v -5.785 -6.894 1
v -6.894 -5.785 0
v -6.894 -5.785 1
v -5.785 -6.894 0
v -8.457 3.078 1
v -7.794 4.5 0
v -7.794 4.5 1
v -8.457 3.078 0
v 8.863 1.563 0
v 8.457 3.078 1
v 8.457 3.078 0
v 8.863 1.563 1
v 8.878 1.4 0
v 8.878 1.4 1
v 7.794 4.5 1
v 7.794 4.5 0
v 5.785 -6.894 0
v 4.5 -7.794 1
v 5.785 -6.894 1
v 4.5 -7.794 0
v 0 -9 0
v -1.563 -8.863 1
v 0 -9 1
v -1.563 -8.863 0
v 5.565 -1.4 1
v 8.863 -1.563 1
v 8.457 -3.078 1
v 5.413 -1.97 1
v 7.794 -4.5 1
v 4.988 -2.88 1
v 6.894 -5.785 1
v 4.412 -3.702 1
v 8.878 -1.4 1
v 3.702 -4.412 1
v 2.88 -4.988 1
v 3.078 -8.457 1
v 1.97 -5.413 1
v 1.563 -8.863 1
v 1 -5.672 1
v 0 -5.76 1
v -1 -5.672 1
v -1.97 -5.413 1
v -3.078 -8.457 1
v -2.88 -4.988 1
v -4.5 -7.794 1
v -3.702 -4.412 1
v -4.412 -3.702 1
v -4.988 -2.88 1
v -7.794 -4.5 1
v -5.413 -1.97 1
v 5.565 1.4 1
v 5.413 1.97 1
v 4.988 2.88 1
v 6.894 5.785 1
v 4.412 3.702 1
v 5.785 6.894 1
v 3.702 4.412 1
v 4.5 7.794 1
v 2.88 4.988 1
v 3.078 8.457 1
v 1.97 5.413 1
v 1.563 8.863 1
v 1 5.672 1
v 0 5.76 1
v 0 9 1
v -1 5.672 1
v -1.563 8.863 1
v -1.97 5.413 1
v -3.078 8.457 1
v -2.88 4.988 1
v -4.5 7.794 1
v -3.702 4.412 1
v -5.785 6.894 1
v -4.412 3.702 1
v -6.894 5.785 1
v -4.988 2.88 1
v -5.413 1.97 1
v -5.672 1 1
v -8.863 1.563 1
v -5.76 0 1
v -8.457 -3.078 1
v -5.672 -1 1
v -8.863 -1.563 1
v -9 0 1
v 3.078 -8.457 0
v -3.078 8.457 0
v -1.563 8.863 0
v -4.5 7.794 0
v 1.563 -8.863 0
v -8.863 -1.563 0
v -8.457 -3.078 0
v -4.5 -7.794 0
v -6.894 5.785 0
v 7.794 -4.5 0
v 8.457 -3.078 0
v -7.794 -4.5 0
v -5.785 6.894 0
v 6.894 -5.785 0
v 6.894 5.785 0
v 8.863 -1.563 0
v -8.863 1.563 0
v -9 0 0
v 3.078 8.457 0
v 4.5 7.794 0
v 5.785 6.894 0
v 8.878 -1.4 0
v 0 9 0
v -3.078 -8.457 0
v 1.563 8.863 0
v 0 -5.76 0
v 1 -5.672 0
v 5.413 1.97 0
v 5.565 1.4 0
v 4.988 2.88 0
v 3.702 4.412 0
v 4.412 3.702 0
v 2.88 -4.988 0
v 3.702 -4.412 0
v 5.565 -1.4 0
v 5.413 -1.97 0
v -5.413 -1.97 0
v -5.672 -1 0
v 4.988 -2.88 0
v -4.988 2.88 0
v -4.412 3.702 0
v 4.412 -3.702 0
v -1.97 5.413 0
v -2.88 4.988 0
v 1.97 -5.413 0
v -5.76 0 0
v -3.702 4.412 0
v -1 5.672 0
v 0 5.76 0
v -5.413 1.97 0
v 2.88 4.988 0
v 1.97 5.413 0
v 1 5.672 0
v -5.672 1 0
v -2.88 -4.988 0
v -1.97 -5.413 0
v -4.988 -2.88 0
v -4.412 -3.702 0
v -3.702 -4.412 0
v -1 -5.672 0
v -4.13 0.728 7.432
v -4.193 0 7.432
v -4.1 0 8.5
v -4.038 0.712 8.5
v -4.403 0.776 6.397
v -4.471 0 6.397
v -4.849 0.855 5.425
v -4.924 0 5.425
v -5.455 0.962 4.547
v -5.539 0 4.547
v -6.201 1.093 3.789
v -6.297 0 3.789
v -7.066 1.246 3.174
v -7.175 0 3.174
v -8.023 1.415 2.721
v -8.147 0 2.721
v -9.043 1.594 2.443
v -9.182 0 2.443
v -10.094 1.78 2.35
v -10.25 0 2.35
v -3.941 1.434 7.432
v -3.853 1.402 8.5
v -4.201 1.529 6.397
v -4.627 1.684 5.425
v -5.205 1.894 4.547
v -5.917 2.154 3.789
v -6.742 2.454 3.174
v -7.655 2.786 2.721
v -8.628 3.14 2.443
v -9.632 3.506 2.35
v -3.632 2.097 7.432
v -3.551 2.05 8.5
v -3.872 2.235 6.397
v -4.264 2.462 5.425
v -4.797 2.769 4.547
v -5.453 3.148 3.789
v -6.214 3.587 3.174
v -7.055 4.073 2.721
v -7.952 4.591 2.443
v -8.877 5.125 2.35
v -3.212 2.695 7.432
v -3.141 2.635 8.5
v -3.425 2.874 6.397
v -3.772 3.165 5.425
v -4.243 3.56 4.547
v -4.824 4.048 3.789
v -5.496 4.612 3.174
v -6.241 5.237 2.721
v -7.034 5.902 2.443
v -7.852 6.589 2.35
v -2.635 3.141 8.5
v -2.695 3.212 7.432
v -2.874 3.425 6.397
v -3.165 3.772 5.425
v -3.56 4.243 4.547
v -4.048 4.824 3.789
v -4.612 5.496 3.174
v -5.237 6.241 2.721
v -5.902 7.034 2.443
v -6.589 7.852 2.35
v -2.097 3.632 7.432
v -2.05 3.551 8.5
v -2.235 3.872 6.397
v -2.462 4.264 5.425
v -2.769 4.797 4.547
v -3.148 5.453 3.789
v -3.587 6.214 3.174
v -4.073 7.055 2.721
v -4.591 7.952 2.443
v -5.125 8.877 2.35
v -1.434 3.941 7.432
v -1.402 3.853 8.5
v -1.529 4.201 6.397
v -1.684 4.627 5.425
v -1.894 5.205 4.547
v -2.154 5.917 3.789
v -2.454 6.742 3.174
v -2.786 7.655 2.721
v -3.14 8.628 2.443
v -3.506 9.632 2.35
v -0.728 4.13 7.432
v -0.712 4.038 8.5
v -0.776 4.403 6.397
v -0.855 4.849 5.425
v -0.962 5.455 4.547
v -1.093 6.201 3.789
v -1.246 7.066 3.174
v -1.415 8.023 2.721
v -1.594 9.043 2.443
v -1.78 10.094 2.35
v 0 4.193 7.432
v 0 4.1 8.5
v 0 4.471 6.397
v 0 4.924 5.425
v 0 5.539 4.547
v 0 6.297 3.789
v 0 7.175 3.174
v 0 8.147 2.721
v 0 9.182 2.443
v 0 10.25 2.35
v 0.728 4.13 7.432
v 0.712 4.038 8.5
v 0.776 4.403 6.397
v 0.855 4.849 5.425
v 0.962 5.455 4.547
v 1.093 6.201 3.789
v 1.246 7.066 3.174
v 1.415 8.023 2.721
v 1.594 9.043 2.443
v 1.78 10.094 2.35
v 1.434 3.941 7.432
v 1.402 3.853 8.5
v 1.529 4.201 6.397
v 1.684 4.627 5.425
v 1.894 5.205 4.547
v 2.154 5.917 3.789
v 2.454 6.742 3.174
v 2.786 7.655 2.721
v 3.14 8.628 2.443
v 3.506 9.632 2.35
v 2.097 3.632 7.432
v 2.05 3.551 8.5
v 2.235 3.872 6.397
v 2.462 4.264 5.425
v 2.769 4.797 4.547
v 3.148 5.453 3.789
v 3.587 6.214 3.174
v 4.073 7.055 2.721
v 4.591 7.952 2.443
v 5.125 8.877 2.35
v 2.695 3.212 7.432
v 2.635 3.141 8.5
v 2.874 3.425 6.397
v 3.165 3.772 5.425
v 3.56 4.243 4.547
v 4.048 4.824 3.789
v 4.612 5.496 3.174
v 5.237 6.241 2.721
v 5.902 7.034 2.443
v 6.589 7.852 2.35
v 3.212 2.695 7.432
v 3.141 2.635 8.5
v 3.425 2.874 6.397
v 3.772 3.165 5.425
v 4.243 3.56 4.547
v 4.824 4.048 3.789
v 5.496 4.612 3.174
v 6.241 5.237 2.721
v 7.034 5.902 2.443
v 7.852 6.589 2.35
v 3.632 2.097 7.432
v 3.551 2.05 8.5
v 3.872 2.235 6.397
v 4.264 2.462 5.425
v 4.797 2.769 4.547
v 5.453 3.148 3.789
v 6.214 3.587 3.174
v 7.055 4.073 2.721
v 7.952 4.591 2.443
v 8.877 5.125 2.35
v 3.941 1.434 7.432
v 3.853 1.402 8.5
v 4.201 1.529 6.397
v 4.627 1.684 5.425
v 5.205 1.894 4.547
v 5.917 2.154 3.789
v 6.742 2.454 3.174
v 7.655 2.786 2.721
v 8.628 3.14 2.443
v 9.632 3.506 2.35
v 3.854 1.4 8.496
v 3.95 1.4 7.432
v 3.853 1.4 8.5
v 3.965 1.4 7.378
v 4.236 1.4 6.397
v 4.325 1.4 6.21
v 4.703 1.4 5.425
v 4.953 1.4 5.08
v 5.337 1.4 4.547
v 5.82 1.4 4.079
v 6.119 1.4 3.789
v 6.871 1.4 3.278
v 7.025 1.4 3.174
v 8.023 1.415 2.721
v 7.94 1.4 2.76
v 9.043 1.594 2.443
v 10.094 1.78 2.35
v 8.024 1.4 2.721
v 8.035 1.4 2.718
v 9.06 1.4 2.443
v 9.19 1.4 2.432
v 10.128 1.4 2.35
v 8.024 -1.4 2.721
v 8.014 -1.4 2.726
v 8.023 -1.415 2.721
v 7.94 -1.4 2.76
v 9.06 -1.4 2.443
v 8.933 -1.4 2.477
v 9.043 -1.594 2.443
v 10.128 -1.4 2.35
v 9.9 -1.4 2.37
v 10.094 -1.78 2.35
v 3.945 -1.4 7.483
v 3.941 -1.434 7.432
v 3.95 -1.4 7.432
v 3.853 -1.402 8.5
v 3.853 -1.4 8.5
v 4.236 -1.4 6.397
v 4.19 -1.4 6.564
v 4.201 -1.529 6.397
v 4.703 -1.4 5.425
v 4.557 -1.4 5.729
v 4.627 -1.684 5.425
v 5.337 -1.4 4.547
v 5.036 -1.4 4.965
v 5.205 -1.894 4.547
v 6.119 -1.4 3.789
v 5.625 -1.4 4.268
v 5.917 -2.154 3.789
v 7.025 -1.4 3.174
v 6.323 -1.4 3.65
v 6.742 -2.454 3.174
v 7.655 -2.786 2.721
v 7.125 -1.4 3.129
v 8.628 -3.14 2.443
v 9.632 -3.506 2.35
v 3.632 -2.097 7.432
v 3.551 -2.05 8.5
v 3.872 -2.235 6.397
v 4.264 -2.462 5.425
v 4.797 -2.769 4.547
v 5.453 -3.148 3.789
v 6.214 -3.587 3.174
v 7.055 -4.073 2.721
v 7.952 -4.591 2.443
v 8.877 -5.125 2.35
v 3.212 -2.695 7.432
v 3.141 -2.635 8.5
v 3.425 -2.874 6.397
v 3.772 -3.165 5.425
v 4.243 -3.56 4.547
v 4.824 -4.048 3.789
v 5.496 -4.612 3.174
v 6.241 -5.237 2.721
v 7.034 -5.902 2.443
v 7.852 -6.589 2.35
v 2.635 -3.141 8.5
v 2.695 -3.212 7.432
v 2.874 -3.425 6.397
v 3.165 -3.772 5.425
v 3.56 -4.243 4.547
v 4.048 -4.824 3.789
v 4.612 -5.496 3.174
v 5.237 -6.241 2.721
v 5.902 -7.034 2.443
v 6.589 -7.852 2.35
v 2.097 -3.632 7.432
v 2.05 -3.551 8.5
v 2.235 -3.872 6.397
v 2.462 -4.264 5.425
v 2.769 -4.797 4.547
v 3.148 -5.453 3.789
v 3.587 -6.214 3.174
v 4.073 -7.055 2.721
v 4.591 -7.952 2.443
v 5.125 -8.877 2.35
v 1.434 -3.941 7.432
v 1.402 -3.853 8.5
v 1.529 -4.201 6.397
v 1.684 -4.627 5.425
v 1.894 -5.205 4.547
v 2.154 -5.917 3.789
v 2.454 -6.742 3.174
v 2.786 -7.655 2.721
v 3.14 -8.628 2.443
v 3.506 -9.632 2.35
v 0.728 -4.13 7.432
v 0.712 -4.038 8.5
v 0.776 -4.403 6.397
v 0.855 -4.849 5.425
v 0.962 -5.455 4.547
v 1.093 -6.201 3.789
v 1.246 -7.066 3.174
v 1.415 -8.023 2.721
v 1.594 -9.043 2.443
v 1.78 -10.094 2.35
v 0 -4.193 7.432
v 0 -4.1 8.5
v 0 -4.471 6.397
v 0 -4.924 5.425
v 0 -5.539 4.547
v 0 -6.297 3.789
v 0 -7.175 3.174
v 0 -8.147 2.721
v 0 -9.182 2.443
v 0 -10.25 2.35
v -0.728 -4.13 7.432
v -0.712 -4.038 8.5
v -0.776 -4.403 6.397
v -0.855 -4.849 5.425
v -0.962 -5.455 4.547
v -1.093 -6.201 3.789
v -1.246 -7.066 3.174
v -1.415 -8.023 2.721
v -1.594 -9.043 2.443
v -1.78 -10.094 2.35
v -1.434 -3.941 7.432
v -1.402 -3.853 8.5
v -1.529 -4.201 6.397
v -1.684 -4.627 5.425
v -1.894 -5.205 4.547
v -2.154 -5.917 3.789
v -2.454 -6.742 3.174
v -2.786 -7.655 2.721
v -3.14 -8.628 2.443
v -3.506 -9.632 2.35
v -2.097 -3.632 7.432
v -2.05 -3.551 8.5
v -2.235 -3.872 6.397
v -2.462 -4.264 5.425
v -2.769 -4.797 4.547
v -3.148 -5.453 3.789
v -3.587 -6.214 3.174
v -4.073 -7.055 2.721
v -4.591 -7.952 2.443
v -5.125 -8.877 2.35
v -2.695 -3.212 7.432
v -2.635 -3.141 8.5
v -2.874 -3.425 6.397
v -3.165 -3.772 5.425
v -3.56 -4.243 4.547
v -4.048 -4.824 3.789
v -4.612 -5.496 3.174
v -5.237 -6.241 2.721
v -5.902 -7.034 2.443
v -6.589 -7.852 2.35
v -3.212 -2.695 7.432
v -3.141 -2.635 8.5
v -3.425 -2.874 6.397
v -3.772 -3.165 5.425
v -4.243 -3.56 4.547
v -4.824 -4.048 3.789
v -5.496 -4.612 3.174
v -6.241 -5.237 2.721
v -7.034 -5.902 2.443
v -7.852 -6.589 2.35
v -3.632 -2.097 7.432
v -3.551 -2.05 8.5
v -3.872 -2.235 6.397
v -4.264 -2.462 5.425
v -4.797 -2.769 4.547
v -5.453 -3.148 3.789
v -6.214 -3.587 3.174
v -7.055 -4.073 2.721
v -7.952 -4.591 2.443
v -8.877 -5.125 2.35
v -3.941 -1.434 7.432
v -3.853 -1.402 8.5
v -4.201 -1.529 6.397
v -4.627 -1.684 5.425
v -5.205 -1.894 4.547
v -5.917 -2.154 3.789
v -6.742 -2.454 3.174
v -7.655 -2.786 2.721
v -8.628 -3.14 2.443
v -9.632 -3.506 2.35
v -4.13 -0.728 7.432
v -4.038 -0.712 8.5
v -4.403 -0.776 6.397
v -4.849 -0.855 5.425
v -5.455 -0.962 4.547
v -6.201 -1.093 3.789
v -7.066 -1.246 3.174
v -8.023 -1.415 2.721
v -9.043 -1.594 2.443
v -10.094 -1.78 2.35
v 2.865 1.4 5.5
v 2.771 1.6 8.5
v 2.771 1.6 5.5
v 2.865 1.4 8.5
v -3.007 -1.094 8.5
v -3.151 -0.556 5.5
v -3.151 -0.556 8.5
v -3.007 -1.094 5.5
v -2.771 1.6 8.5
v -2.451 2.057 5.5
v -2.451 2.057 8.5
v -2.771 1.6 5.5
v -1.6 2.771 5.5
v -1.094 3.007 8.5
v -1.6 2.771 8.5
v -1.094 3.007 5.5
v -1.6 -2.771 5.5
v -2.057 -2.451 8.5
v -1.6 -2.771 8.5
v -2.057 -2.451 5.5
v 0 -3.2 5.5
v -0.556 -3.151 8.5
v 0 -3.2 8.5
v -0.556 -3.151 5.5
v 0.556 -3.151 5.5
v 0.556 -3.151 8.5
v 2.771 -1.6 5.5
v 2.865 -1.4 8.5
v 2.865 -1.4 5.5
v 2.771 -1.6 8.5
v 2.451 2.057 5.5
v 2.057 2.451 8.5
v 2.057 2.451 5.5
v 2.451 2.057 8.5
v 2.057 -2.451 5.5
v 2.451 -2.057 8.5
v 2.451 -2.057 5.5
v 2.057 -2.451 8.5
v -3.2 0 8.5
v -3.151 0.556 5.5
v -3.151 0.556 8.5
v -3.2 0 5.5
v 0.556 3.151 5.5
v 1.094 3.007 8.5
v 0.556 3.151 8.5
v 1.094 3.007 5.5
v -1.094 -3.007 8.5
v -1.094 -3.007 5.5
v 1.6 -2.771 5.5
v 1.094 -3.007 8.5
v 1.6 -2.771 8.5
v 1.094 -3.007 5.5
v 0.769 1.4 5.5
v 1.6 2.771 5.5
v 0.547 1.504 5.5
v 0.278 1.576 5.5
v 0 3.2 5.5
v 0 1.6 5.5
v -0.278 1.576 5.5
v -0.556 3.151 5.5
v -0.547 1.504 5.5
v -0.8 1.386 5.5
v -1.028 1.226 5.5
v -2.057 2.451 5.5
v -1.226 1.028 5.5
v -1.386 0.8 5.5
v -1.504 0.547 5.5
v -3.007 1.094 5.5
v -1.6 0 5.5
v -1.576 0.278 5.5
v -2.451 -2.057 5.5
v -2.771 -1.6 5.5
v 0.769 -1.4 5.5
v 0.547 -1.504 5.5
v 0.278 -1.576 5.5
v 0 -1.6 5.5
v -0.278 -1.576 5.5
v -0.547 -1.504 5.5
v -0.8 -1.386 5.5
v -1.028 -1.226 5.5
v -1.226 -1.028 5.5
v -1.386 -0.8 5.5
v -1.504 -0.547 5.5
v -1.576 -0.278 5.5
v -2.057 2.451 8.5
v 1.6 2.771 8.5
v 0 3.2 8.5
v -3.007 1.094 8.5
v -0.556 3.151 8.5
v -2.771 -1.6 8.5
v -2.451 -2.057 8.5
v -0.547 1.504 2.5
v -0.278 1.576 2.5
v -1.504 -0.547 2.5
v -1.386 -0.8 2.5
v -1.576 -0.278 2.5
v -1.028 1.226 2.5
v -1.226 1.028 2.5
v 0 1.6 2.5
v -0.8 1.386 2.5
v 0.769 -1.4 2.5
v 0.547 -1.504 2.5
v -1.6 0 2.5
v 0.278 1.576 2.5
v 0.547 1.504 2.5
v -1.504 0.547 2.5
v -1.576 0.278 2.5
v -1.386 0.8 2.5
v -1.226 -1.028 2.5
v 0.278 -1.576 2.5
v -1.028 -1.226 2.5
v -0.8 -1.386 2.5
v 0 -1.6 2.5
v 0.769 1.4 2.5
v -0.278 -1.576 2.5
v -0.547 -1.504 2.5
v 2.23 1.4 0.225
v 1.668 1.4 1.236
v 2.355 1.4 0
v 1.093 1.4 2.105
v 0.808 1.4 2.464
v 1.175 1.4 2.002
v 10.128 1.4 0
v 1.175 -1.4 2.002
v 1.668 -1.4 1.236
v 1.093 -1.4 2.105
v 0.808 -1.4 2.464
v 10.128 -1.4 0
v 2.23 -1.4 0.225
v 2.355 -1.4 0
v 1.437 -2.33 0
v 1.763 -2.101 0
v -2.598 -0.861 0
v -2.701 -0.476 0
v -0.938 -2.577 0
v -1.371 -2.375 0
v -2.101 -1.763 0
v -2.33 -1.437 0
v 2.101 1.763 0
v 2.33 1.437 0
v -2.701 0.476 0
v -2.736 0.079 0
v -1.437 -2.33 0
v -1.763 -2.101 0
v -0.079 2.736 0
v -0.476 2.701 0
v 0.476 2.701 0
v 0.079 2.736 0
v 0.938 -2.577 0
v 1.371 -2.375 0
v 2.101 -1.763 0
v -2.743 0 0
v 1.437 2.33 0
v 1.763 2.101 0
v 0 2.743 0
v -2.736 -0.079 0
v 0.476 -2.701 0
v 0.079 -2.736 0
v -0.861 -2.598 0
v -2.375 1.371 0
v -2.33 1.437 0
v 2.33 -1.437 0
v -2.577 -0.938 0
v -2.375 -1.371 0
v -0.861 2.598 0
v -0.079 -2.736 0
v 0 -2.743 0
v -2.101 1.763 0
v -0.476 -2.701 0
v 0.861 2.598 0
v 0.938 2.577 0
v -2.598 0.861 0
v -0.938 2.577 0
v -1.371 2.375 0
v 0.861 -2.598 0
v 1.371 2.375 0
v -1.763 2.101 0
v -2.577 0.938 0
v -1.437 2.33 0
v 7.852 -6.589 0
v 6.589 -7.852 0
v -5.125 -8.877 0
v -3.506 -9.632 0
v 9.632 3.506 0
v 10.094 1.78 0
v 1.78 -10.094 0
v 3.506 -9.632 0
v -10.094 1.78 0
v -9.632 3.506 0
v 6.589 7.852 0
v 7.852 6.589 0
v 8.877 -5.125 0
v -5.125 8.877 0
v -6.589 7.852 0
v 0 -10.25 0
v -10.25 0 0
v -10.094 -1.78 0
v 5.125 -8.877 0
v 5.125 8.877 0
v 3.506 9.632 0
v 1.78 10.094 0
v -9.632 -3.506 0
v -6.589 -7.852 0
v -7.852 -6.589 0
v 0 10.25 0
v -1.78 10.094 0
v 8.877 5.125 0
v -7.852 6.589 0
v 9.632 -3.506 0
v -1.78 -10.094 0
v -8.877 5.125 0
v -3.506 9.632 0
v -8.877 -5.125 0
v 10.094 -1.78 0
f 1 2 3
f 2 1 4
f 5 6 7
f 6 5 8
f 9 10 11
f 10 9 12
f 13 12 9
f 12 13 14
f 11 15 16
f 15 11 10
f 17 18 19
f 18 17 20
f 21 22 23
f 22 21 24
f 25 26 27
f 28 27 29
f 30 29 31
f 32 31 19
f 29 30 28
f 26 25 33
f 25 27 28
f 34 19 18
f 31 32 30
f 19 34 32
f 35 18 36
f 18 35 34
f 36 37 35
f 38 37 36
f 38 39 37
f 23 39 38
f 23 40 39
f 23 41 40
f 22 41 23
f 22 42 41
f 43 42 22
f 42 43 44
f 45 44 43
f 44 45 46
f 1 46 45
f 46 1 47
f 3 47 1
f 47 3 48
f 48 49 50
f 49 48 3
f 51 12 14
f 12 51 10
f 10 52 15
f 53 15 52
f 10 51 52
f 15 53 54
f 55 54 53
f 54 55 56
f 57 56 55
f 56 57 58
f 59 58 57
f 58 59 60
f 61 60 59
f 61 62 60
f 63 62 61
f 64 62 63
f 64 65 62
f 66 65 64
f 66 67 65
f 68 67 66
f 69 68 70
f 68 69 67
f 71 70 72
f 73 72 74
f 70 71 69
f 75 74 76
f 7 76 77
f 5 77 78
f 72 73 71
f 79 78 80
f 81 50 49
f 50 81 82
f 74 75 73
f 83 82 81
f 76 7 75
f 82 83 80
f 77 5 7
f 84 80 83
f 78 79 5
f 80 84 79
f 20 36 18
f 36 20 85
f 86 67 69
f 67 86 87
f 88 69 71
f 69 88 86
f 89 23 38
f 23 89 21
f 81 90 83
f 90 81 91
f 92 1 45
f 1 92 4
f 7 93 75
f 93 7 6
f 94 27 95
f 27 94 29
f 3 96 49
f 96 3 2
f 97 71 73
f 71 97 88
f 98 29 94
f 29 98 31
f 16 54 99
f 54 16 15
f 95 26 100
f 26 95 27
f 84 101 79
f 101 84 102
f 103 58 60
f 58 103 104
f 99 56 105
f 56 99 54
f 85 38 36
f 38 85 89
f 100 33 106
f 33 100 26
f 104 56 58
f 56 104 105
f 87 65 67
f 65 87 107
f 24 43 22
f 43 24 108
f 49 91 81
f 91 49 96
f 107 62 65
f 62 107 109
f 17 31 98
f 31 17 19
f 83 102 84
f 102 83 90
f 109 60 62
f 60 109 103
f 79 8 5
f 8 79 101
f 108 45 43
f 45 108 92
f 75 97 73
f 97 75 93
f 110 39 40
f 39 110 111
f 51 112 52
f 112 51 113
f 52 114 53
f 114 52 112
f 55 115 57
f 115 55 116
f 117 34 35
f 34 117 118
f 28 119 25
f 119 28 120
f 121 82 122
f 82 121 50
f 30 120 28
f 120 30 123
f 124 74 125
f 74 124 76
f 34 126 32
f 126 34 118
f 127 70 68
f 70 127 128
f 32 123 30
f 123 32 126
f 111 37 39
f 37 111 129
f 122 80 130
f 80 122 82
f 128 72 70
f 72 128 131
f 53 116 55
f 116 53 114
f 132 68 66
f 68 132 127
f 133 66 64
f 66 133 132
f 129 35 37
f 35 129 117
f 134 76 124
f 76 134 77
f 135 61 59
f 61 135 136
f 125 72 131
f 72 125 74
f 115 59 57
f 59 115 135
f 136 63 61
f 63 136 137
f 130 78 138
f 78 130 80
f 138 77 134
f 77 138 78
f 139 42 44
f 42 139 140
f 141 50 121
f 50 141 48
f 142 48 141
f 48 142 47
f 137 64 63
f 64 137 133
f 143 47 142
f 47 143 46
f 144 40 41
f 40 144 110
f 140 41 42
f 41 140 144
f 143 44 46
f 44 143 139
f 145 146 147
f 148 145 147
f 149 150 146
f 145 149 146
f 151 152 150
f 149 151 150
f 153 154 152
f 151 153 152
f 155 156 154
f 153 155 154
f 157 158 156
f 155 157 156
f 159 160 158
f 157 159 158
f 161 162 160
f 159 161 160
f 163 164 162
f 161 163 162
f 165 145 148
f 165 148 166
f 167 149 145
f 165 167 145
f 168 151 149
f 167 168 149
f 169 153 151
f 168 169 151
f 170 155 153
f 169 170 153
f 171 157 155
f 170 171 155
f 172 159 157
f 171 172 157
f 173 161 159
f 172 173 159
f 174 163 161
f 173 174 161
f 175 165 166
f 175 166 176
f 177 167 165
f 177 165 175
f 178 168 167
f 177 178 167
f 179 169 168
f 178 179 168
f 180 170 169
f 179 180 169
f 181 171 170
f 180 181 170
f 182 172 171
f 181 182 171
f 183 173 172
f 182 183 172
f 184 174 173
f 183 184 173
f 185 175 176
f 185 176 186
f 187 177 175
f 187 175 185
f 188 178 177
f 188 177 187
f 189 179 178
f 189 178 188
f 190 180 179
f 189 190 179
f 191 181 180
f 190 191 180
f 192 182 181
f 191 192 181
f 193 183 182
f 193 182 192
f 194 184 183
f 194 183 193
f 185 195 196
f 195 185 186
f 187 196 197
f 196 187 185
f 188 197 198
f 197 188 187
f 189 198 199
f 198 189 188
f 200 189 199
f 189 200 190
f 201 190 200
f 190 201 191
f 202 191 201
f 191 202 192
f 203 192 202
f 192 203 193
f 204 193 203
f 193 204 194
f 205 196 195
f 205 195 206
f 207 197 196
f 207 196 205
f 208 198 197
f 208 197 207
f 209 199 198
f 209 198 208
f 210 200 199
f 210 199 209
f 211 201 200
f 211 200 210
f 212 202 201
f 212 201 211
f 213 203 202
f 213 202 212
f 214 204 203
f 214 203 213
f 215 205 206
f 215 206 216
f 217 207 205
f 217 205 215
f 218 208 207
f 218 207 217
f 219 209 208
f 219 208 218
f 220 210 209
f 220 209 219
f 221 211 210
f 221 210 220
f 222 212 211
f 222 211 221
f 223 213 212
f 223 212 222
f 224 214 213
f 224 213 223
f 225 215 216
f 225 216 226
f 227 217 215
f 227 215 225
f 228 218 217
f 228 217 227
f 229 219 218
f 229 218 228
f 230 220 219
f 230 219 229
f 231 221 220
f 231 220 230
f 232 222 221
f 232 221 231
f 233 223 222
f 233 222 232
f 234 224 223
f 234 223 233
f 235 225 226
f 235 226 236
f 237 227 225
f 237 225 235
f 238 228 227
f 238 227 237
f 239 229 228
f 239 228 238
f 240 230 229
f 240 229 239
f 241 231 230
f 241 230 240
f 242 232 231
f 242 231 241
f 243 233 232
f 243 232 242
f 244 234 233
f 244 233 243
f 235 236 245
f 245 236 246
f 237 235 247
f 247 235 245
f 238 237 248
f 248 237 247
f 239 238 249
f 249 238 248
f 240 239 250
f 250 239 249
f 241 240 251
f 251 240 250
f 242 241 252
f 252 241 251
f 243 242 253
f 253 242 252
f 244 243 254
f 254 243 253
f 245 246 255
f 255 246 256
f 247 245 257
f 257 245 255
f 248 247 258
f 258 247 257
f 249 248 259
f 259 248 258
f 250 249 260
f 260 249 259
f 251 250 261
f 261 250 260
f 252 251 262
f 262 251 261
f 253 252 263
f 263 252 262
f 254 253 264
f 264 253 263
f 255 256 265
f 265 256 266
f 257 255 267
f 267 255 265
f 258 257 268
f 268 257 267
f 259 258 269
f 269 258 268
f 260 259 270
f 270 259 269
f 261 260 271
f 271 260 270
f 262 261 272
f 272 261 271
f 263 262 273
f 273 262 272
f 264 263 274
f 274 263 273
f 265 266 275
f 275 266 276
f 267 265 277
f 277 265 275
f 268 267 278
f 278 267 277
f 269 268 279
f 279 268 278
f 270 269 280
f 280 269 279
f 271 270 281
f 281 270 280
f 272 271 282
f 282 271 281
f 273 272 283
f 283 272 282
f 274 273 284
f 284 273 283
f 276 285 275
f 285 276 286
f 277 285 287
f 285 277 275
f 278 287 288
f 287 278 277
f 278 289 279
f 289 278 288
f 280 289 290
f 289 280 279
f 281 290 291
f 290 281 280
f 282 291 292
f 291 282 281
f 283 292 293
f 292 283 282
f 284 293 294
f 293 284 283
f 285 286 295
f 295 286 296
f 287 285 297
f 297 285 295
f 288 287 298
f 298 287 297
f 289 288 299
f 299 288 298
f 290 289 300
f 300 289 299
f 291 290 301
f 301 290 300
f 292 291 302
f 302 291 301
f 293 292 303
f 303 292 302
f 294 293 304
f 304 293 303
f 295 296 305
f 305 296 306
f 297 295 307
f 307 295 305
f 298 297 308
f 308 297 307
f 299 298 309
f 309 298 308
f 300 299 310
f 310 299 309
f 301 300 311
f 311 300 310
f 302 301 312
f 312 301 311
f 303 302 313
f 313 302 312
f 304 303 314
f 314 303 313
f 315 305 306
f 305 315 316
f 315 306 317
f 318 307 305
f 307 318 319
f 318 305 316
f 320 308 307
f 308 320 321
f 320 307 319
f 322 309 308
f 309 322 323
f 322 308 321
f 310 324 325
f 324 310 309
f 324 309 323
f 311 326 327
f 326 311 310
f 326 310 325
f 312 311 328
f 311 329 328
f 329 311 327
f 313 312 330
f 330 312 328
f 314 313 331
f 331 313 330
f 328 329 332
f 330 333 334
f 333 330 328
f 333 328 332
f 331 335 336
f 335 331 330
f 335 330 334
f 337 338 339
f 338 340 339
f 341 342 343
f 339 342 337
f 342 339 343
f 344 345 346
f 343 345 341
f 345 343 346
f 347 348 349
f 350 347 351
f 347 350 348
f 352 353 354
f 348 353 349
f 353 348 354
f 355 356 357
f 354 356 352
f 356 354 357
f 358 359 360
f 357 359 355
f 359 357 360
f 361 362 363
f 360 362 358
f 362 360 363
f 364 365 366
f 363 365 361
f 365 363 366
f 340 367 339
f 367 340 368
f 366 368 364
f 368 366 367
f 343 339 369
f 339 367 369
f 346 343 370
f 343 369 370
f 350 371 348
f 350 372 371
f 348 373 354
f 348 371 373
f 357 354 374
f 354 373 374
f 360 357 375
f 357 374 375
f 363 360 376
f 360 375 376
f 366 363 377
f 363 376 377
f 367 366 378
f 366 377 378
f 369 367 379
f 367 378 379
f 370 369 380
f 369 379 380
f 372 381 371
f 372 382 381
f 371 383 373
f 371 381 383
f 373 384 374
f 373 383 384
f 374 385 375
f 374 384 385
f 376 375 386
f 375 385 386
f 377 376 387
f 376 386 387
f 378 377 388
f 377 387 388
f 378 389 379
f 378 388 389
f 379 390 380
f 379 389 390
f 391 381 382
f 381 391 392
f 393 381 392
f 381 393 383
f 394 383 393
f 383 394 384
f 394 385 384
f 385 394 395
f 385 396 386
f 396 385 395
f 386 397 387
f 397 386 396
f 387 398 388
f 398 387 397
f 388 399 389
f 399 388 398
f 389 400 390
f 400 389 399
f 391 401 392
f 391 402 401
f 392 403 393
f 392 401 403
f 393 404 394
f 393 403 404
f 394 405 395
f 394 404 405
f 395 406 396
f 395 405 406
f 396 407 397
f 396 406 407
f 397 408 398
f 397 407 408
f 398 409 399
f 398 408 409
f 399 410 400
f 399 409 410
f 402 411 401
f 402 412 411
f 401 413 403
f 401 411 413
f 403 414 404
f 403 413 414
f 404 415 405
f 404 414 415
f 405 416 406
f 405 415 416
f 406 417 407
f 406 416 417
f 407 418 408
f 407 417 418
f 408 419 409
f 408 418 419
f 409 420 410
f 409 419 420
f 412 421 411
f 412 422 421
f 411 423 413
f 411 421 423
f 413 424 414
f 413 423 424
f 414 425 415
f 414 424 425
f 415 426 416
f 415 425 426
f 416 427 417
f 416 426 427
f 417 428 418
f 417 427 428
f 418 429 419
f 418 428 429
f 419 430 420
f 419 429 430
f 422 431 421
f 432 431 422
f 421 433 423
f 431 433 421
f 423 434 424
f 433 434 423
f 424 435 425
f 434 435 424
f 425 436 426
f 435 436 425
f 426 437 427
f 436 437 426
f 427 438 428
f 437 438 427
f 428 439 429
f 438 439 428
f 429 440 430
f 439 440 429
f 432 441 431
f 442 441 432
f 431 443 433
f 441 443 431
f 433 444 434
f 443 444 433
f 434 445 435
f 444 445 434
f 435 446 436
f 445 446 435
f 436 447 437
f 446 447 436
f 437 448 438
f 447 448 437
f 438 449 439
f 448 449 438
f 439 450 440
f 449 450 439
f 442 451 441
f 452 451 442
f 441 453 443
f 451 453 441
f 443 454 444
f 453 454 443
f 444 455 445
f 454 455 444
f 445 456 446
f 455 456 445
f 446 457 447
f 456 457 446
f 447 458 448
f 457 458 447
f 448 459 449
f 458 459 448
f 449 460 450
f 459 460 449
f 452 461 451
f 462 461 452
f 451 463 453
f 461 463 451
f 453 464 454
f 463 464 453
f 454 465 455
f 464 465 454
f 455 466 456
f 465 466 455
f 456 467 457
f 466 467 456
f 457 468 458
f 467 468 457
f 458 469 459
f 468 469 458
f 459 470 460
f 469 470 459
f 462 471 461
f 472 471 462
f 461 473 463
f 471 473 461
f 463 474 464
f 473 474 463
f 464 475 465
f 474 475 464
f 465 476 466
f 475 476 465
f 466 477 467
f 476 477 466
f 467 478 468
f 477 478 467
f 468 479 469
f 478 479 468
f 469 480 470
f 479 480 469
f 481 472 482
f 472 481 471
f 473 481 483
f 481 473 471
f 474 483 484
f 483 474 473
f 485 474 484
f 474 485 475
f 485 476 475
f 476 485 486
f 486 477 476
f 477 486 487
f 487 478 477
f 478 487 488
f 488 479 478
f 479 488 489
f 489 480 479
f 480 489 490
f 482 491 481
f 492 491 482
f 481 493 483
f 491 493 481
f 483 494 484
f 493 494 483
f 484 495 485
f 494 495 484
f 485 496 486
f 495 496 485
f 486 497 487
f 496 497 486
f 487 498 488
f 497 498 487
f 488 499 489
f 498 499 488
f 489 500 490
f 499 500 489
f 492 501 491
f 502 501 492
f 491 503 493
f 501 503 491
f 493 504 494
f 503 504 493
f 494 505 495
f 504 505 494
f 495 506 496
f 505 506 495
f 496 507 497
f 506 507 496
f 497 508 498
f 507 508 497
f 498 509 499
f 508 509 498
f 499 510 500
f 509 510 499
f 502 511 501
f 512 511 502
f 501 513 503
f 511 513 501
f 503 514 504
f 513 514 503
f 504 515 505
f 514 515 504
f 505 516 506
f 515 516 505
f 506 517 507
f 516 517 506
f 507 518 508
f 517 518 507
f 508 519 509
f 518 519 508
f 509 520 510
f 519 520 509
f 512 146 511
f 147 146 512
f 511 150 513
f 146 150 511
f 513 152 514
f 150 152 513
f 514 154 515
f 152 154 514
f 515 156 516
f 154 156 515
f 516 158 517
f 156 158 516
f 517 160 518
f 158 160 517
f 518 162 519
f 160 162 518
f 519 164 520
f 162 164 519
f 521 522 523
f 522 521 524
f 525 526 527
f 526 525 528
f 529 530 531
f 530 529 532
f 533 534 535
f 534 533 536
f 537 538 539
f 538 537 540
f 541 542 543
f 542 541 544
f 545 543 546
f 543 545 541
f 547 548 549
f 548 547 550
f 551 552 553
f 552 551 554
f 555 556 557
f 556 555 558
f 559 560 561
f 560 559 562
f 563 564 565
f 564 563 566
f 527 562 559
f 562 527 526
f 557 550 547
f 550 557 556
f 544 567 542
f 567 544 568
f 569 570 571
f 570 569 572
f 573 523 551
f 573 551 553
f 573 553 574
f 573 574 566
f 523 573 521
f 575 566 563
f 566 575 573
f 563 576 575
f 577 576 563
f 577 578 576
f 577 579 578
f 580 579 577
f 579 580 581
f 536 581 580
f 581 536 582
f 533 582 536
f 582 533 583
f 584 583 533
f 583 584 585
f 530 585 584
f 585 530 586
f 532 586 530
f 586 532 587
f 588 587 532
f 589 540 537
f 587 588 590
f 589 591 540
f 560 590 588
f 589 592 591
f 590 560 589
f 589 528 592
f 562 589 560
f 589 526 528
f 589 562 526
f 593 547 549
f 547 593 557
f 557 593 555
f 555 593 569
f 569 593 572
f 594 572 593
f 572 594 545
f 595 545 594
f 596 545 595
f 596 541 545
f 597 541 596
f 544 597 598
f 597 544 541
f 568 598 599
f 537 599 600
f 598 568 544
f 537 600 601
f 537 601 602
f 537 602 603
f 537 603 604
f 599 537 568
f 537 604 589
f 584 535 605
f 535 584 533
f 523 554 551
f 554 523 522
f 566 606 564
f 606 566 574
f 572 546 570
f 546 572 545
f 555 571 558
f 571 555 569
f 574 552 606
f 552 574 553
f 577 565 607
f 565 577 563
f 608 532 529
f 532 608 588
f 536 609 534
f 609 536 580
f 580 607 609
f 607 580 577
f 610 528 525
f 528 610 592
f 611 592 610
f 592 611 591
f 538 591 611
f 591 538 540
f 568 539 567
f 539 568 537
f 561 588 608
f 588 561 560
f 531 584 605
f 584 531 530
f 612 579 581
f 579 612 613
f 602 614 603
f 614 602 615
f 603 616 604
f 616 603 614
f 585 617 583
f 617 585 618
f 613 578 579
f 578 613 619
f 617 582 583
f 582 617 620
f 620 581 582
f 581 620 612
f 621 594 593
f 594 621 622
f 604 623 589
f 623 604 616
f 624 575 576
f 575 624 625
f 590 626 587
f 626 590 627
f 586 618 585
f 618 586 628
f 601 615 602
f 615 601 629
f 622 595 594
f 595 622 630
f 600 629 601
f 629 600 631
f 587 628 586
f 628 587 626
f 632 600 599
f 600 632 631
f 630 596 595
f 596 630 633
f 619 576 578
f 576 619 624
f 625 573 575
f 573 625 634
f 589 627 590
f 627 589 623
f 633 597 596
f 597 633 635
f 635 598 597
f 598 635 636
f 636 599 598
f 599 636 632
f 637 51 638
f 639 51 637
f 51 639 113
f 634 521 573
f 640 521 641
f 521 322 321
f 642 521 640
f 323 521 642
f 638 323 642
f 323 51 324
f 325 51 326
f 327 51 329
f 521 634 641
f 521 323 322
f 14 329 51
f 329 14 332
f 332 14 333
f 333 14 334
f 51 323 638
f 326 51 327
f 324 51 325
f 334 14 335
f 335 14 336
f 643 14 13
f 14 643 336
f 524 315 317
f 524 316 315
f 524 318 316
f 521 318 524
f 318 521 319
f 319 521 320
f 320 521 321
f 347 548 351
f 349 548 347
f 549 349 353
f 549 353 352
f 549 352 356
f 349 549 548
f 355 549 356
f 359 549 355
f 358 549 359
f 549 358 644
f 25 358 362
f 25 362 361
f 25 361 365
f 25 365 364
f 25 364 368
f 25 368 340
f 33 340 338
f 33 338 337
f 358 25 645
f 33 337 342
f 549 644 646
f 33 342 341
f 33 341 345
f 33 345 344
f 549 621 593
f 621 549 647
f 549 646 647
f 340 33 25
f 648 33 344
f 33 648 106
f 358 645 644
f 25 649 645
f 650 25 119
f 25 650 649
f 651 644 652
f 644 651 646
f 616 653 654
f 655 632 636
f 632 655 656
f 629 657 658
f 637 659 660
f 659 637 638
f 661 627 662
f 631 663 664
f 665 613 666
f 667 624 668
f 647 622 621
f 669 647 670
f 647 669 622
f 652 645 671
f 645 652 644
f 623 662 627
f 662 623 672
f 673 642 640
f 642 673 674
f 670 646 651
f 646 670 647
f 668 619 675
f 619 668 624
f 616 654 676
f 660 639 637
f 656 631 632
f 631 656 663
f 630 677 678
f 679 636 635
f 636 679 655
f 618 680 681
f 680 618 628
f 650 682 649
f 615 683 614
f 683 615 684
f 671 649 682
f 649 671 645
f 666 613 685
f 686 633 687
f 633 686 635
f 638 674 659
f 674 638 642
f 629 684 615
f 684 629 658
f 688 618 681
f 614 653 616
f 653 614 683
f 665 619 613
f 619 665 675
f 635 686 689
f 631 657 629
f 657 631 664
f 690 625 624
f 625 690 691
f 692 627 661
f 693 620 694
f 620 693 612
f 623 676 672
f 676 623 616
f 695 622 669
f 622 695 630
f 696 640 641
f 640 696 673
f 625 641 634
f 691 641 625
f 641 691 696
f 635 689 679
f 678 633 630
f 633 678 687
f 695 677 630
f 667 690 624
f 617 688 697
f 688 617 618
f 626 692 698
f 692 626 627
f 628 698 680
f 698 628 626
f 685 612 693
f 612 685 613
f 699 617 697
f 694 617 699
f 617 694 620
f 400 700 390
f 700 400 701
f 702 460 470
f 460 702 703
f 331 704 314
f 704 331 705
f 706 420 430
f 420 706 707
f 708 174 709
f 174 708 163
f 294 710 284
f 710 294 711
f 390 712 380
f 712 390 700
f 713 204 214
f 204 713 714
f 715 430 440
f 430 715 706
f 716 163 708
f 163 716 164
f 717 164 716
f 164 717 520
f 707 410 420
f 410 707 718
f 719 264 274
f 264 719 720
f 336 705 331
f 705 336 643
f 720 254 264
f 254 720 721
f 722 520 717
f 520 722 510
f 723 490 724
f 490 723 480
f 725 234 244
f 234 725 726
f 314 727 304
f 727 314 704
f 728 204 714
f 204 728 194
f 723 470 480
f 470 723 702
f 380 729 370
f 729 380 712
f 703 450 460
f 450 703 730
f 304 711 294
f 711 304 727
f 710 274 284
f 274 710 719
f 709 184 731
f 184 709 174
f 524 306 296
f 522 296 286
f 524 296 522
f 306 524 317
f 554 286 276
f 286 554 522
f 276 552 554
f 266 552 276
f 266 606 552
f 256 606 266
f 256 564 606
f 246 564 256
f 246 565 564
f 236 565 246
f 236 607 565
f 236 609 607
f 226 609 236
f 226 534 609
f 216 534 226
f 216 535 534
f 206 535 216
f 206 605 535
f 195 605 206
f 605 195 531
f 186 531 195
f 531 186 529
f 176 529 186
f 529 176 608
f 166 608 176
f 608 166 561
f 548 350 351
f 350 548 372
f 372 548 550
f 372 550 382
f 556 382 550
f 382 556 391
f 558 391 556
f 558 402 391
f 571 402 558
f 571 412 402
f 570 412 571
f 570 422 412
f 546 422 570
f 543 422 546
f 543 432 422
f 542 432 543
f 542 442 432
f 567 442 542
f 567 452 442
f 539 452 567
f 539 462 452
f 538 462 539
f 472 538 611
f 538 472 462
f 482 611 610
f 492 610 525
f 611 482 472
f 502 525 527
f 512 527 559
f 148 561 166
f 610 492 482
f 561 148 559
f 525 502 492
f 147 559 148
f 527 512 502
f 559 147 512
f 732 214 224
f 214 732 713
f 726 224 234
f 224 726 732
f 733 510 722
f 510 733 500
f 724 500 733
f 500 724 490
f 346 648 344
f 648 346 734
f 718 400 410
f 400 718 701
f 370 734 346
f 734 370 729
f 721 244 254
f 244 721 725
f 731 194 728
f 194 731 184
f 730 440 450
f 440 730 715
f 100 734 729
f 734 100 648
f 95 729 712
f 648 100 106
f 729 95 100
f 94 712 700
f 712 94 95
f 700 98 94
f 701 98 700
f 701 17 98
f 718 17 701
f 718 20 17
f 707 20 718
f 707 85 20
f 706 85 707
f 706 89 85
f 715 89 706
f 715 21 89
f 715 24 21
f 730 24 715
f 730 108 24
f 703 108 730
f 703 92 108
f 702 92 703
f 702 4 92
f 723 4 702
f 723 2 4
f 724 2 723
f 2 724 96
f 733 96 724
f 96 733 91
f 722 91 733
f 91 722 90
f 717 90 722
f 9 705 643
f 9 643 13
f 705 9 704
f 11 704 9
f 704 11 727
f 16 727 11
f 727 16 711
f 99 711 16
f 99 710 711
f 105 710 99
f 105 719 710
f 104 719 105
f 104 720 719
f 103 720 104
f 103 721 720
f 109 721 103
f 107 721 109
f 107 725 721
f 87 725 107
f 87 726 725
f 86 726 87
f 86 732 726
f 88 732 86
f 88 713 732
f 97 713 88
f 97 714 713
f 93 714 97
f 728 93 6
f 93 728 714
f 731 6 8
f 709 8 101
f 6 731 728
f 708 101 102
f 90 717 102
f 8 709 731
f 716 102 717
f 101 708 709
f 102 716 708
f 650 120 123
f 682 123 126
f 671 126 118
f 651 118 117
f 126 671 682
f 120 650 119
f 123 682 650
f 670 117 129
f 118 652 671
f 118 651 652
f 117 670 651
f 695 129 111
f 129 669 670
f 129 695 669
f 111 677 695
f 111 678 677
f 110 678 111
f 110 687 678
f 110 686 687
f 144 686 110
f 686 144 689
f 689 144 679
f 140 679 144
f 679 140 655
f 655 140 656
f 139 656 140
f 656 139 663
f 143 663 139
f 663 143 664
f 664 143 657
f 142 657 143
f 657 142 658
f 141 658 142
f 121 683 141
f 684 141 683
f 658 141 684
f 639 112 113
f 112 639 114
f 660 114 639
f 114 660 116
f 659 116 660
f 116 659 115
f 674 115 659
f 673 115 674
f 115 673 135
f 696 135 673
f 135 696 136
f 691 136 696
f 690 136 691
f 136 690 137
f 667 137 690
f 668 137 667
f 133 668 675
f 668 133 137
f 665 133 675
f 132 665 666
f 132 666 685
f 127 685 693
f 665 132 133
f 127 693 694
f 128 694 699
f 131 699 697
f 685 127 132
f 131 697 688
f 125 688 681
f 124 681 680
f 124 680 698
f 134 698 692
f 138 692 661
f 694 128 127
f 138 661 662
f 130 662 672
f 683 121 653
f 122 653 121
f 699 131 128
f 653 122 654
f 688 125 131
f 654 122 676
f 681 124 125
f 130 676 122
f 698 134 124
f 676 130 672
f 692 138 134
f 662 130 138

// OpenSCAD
/* 
 Spring retainer for Traxxas R/C cars
 Eric Lindholm
 22 November 2016
*/

// preview[view:south east, tilt:top diagonal]

// Use mm please.
// This is a small part.

// Diameter of middle shaft
ShaftDiameter = 3.2;  // [2:0.1:5]
// Diameter of spring
SpringDiameter = 18;  // [6:0.1:28]

/* [Hidden] */
outerD=SpringDiameter+2.5;  
height=8.5;
filletR=outerD*0.3;
$fn=36;

retainer();

module retainer() {
	difference() {
	// Positive shapes
		union() {
		// Primary shape
			cylinder(r=outerD/2,h=height);
		}
	// Negative shapes
		union() {
		// Fillet	shape
			rotate_extrude(convexity=10)
				translate([outerD/2,height,0])
					circle(r=filletR);
		// Hollow at top
			translate([0,0,height-3])
				cylinder(r=ShaftDiameter,h=height);
		// Spring slot
			translate([0,0,-1])
				difference() {
					cylinder(r=SpringDiameter/2,h=2);
					cylinder(r=ShaftDiameter*1.8,h=2);
				}
		// Shaft hole
			translate([0,0,-1])
				cylinder(r=ShaftDiameter/2,h=height*2);
		// Slot for shaft
			translate([outerD/2,0,height/2])
				cube([outerD,ShaftDiameter*0.875,height*2],center=true);
		// Hollow at bottom
			translate([0,0,-1])
				cylinder(r1=ShaftDiameter,r2=ShaftDiameter/2,h=3.5);
		}
	}
}
